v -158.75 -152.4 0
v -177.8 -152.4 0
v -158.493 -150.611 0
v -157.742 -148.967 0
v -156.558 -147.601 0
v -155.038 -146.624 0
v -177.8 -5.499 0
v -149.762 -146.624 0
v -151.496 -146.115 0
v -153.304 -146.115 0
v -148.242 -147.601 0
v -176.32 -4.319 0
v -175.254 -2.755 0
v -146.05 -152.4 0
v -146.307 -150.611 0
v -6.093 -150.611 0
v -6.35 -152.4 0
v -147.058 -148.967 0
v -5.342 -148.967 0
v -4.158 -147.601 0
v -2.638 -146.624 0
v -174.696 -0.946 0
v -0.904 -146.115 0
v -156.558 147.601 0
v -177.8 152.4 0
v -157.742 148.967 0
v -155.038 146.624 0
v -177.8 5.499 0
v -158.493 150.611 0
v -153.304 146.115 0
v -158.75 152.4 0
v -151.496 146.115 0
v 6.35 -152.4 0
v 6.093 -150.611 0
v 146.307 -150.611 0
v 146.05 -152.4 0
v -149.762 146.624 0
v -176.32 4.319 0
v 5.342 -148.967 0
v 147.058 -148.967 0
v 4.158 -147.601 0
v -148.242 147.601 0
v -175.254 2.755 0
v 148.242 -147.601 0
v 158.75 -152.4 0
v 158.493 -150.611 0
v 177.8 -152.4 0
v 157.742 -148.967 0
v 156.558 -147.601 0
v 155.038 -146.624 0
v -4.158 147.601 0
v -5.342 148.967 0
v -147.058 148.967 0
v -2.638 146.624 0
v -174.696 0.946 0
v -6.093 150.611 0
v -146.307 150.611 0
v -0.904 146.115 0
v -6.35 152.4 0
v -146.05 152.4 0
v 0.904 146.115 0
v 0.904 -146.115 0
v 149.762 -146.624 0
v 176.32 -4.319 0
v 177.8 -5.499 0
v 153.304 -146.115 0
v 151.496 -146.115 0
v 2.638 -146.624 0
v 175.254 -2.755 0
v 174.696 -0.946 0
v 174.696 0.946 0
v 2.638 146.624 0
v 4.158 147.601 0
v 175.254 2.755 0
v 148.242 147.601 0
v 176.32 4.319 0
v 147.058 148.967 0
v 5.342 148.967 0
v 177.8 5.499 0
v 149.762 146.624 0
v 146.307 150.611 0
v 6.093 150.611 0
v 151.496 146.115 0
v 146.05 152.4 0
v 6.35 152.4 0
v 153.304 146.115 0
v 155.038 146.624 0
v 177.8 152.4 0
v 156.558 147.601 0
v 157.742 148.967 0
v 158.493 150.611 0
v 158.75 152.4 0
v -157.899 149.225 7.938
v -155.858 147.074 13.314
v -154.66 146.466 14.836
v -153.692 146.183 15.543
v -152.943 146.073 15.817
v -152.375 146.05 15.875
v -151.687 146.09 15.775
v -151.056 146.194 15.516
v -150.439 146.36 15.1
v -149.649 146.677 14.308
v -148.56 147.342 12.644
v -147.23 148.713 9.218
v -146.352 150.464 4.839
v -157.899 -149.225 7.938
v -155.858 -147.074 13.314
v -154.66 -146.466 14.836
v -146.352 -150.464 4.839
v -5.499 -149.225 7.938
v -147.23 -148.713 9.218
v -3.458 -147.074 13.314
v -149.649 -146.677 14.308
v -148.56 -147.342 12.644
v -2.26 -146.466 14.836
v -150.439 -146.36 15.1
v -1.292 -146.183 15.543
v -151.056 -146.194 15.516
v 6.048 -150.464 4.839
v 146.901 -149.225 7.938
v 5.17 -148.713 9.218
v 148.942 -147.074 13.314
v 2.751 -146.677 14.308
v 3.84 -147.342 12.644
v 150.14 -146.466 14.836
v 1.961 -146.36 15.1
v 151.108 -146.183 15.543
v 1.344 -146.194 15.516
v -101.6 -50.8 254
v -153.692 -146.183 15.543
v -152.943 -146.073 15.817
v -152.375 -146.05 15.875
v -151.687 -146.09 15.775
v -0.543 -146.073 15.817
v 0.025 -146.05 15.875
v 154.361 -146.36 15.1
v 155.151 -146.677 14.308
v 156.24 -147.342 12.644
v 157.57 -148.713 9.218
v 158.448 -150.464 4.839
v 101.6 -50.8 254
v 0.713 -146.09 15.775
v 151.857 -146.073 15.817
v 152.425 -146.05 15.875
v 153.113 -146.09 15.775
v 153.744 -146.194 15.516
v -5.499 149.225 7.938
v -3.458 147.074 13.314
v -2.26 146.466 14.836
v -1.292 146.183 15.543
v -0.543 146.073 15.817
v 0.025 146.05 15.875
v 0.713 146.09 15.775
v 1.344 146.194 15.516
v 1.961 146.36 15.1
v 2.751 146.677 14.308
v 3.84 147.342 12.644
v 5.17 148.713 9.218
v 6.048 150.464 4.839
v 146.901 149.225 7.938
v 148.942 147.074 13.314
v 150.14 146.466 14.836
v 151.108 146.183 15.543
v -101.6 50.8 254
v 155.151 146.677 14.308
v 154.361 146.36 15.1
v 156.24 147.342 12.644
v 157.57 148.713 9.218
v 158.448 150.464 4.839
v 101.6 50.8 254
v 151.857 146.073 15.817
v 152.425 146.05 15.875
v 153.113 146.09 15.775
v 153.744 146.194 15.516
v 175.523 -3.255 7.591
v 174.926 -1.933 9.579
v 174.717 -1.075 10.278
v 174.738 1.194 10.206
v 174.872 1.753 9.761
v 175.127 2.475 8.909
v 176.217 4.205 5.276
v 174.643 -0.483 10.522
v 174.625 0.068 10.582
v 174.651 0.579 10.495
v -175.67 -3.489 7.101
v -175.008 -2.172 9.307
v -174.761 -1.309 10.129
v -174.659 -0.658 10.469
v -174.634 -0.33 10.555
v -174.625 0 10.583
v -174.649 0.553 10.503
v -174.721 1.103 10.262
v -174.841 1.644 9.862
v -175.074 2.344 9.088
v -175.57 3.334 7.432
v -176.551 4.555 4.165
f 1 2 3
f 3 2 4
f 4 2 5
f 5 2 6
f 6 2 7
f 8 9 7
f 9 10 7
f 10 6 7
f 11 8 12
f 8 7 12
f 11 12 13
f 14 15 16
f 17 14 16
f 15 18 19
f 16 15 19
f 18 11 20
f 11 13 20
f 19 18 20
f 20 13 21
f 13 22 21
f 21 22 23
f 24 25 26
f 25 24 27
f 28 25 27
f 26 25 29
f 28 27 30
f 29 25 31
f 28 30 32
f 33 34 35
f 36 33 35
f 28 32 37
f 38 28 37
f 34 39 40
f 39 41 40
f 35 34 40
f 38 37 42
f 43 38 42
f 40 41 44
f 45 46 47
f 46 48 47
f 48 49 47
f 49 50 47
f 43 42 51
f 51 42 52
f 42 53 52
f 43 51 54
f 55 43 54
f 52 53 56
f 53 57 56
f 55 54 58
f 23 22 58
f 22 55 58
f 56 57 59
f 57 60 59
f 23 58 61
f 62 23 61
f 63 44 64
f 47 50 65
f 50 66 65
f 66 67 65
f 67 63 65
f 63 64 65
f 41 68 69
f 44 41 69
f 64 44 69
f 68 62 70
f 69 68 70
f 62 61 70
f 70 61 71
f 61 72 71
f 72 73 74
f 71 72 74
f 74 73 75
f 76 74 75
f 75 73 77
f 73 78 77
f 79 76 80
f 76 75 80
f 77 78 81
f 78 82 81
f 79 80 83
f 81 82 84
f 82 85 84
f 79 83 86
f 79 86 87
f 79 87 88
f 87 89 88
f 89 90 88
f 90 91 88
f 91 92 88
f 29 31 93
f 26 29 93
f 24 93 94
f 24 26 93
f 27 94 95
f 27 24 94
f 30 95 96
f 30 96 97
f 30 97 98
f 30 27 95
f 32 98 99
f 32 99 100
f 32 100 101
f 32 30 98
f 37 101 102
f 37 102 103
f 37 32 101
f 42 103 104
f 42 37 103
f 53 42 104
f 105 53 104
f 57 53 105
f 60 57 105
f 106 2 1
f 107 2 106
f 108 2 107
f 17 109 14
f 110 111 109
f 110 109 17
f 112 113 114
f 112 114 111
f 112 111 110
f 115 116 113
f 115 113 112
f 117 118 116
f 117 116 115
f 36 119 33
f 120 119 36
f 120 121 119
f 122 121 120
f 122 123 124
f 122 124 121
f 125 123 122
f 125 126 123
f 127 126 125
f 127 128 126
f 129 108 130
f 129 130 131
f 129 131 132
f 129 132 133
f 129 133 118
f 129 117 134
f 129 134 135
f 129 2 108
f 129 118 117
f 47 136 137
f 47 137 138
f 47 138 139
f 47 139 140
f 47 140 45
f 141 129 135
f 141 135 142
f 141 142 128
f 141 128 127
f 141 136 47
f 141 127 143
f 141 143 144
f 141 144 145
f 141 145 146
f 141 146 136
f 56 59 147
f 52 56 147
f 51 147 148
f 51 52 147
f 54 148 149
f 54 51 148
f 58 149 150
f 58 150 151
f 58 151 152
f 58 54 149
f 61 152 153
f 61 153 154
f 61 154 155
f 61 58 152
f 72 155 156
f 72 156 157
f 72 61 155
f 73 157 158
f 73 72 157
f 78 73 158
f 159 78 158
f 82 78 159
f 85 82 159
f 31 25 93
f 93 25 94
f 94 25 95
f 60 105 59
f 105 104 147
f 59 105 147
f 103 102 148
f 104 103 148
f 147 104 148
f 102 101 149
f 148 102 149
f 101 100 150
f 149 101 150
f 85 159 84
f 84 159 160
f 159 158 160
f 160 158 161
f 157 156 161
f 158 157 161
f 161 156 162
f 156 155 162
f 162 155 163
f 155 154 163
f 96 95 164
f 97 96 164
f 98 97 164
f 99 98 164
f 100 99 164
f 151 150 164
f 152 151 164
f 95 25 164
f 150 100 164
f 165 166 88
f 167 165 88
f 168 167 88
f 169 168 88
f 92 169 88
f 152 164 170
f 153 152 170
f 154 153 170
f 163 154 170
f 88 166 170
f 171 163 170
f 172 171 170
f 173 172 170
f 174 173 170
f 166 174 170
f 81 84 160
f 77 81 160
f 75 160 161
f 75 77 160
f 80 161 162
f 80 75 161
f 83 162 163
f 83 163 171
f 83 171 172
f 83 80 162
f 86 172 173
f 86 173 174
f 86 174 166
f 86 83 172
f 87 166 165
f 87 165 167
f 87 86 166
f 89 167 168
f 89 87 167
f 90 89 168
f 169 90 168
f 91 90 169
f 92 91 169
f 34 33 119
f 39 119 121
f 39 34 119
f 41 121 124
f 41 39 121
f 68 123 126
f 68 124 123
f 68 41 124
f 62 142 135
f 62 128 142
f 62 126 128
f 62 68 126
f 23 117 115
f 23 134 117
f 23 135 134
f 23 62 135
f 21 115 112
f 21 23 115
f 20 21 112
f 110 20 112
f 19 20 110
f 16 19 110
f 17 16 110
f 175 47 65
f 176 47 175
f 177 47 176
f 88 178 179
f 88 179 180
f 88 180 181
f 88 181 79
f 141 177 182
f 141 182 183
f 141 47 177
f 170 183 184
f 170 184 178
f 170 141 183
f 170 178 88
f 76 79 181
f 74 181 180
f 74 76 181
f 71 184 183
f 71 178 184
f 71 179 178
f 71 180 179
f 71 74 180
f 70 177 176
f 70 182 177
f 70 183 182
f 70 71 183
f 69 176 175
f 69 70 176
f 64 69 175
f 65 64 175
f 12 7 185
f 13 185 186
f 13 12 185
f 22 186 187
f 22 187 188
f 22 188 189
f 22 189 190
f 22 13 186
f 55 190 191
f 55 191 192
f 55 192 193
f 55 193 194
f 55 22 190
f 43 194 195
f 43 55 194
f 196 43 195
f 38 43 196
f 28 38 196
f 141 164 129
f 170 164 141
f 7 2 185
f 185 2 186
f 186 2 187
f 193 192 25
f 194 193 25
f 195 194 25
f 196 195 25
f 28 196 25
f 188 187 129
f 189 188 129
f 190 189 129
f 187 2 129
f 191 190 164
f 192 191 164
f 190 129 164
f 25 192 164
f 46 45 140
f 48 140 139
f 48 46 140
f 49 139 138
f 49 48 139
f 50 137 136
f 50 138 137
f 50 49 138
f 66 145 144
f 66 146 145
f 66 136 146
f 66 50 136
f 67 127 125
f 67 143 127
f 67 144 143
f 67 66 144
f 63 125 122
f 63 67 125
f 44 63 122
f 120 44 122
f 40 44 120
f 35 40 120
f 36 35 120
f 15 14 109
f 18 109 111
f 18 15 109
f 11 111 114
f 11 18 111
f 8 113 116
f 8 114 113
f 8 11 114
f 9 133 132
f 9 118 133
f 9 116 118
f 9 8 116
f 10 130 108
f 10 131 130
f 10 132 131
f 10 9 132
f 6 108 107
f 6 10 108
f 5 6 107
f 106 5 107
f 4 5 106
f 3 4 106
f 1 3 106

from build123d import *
from OCP.BRepFilletAPI import BRepFilletAPI_MakeChamfer

# Parameters (mm, degrees)
SKETCH1_W           = 355.6
SKETCH1_H           = 304.8
BOSS_EXTRUDE1_DEPTH = 254
CHAMFER1_SIZE       = 254
CHAMFER1_SIZE_2     = 101.6
CHAMFER2_SIZE       = 254
CHAMFER2_SIZE_2     = 76.2
SKETCH2_R           = 6.35
CUT_EXTRUDE1_DEPTH  = 346.477350922


with BuildPart() as part:
    # Sketch1 → Boss-Extrude1 (new body)
    with BuildSketch(Plane.XY):
        Rectangle(SKETCH1_W, SKETCH1_H)
    extrude(amount=BOSS_EXTRUDE1_DEPTH)

    # Chamfer1
    chamfer1_edges_1 = [part.edges().sort_by_distance(p)[0] for p in [
        (0, -152.4, 254),
    ]]
    chamfer1_side_1 = [part.faces().sort_by_distance(p)[0] for p in [
        (0, -152.4, 251.968),
    ]]
    chamfer1_edges_2 = [part.edges().sort_by_distance(p)[0] for p in [
        (0, 152.4, 254),
    ]]
    chamfer1_side_2 = [part.faces().sort_by_distance(p)[0] for p in [
        (0, 152.4, 251.968),
    ]]
    chamfer1 = BRepFilletAPI_MakeChamfer(part.part.solid().wrapped)
    for e in chamfer1_edges_1:
        chamfer1.Add(CHAMFER1_SIZE - 0.0001, CHAMFER1_SIZE_2 - 0.0001, e.wrapped, chamfer1_side_1[0].wrapped)
    for e in chamfer1_edges_2:
        chamfer1.Add(CHAMFER1_SIZE - 0.0001, CHAMFER1_SIZE_2 - 0.0001, e.wrapped, chamfer1_side_2[0].wrapped)
    add(Compound.cast(chamfer1.Shape()), mode=Mode.REPLACE)  # a hair under: the kernel refuses the full size

    # Chamfer2
    chamfer2_edges_1 = [part.edges().sort_by_distance(p)[0] for p in [
        (177.8, 0, 254),
    ]]
    chamfer2_side_1 = [part.faces().sort_by_distance(p)[0] for p in [
        (177.8, 0, 252.476),
    ]]
    chamfer2_edges_2 = [part.edges().sort_by_distance(p)[0] for p in [
        (-177.8, 0, 254),
    ]]
    chamfer2_side_2 = [part.faces().sort_by_distance(p)[0] for p in [
        (-177.8, 0, 252.476),
    ]]
    chamfer2 = BRepFilletAPI_MakeChamfer(part.part.solid().wrapped)
    for e in chamfer2_edges_1:
        chamfer2.Add(CHAMFER2_SIZE - 0.0001, CHAMFER2_SIZE_2 - 0.0001, e.wrapped, chamfer2_side_1[0].wrapped)
    for e in chamfer2_edges_2:
        chamfer2.Add(CHAMFER2_SIZE - 0.0001, CHAMFER2_SIZE_2 - 0.0001, e.wrapped, chamfer2_side_2[0].wrapped)
    add(Compound.cast(chamfer2.Shape()), mode=Mode.REPLACE)  # a hair under: the kernel refuses the full size

    # Sketch2 → Cut-Extrude1 (cut, through all)
    with BuildSketch(Plane.XY):
        with Locations((-180.975, 0)):
            Circle(SKETCH2_R)
        with Locations((0, 152.4)):
            Circle(SKETCH2_R)
        with Locations((152.4, 152.4)):
            Circle(SKETCH2_R)
        with Locations((-152.4, 152.4)):
            Circle(SKETCH2_R)
        with Locations((180.975, 0)):
            Circle(SKETCH2_R)
        with Locations((152.4, -152.4)):
            Circle(SKETCH2_R)
        with Locations((0, -152.4)):
            Circle(SKETCH2_R)
        with Locations((-152.4, -152.4)):
            Circle(SKETCH2_R)
    extrude(amount=CUT_EXTRUDE1_DEPTH, mode=Mode.SUBTRACT)


solid = part.part
